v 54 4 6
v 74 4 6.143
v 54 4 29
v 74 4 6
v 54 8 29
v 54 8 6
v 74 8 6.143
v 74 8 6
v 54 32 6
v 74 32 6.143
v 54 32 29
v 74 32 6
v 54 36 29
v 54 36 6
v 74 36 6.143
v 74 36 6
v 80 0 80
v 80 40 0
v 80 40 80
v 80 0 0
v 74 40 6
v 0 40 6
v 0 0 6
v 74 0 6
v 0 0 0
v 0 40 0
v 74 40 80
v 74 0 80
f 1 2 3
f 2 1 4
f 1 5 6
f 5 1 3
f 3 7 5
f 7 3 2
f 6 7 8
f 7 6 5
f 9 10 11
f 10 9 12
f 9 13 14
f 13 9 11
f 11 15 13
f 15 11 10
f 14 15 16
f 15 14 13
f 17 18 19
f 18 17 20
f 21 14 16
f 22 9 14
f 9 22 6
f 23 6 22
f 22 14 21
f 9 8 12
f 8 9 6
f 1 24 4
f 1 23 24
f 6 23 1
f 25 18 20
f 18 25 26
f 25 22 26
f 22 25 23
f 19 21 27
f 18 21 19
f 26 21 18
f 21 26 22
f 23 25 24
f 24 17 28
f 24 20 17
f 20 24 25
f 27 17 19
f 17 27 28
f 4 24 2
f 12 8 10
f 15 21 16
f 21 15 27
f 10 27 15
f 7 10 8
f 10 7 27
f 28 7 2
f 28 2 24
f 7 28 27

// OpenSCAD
$fn = 32;

// ----------------------------------------------------------------------
// Rib bracket: 2-gusset L bracket
// ----------------------------------------------------------------------

// --- parameters (mm) ---
base_l = 80;              // foot length, X
base_w = 40;              // foot width, Y
base_t = 6;               // foot thickness
plate_t = 6;              // upright plate thickness
plate_h = 80;             // overall height
gus_l = 20;               // gusset leg along the foot
gus_h = 24;               // gusset height
gus_t = 4;                // gusset thickness
gus_edge = 4;             // gusset margin from the foot edge
n_gus = 2;                // gusset count

gus_pitch = (base_w - 2 * gus_edge - gus_t) / (n_gus - 1);  // gusset pitch

union() {
  cube([base_l, base_w, base_t]);
  translate([base_l - plate_t, 0, base_t - 1])
    cube([plate_t, base_w, plate_h - base_t + 1]);
  for (i = [0 : n_gus - 1])
    translate([base_l - plate_t - gus_l, gus_edge + i * gus_pitch, base_t - 1])
      rotate([-90, 0, 0])
        linear_extrude(height = gus_t)
          polygon(points = [[0, 0], [gus_l + 1, 0], [0, -gus_h]]);
}
